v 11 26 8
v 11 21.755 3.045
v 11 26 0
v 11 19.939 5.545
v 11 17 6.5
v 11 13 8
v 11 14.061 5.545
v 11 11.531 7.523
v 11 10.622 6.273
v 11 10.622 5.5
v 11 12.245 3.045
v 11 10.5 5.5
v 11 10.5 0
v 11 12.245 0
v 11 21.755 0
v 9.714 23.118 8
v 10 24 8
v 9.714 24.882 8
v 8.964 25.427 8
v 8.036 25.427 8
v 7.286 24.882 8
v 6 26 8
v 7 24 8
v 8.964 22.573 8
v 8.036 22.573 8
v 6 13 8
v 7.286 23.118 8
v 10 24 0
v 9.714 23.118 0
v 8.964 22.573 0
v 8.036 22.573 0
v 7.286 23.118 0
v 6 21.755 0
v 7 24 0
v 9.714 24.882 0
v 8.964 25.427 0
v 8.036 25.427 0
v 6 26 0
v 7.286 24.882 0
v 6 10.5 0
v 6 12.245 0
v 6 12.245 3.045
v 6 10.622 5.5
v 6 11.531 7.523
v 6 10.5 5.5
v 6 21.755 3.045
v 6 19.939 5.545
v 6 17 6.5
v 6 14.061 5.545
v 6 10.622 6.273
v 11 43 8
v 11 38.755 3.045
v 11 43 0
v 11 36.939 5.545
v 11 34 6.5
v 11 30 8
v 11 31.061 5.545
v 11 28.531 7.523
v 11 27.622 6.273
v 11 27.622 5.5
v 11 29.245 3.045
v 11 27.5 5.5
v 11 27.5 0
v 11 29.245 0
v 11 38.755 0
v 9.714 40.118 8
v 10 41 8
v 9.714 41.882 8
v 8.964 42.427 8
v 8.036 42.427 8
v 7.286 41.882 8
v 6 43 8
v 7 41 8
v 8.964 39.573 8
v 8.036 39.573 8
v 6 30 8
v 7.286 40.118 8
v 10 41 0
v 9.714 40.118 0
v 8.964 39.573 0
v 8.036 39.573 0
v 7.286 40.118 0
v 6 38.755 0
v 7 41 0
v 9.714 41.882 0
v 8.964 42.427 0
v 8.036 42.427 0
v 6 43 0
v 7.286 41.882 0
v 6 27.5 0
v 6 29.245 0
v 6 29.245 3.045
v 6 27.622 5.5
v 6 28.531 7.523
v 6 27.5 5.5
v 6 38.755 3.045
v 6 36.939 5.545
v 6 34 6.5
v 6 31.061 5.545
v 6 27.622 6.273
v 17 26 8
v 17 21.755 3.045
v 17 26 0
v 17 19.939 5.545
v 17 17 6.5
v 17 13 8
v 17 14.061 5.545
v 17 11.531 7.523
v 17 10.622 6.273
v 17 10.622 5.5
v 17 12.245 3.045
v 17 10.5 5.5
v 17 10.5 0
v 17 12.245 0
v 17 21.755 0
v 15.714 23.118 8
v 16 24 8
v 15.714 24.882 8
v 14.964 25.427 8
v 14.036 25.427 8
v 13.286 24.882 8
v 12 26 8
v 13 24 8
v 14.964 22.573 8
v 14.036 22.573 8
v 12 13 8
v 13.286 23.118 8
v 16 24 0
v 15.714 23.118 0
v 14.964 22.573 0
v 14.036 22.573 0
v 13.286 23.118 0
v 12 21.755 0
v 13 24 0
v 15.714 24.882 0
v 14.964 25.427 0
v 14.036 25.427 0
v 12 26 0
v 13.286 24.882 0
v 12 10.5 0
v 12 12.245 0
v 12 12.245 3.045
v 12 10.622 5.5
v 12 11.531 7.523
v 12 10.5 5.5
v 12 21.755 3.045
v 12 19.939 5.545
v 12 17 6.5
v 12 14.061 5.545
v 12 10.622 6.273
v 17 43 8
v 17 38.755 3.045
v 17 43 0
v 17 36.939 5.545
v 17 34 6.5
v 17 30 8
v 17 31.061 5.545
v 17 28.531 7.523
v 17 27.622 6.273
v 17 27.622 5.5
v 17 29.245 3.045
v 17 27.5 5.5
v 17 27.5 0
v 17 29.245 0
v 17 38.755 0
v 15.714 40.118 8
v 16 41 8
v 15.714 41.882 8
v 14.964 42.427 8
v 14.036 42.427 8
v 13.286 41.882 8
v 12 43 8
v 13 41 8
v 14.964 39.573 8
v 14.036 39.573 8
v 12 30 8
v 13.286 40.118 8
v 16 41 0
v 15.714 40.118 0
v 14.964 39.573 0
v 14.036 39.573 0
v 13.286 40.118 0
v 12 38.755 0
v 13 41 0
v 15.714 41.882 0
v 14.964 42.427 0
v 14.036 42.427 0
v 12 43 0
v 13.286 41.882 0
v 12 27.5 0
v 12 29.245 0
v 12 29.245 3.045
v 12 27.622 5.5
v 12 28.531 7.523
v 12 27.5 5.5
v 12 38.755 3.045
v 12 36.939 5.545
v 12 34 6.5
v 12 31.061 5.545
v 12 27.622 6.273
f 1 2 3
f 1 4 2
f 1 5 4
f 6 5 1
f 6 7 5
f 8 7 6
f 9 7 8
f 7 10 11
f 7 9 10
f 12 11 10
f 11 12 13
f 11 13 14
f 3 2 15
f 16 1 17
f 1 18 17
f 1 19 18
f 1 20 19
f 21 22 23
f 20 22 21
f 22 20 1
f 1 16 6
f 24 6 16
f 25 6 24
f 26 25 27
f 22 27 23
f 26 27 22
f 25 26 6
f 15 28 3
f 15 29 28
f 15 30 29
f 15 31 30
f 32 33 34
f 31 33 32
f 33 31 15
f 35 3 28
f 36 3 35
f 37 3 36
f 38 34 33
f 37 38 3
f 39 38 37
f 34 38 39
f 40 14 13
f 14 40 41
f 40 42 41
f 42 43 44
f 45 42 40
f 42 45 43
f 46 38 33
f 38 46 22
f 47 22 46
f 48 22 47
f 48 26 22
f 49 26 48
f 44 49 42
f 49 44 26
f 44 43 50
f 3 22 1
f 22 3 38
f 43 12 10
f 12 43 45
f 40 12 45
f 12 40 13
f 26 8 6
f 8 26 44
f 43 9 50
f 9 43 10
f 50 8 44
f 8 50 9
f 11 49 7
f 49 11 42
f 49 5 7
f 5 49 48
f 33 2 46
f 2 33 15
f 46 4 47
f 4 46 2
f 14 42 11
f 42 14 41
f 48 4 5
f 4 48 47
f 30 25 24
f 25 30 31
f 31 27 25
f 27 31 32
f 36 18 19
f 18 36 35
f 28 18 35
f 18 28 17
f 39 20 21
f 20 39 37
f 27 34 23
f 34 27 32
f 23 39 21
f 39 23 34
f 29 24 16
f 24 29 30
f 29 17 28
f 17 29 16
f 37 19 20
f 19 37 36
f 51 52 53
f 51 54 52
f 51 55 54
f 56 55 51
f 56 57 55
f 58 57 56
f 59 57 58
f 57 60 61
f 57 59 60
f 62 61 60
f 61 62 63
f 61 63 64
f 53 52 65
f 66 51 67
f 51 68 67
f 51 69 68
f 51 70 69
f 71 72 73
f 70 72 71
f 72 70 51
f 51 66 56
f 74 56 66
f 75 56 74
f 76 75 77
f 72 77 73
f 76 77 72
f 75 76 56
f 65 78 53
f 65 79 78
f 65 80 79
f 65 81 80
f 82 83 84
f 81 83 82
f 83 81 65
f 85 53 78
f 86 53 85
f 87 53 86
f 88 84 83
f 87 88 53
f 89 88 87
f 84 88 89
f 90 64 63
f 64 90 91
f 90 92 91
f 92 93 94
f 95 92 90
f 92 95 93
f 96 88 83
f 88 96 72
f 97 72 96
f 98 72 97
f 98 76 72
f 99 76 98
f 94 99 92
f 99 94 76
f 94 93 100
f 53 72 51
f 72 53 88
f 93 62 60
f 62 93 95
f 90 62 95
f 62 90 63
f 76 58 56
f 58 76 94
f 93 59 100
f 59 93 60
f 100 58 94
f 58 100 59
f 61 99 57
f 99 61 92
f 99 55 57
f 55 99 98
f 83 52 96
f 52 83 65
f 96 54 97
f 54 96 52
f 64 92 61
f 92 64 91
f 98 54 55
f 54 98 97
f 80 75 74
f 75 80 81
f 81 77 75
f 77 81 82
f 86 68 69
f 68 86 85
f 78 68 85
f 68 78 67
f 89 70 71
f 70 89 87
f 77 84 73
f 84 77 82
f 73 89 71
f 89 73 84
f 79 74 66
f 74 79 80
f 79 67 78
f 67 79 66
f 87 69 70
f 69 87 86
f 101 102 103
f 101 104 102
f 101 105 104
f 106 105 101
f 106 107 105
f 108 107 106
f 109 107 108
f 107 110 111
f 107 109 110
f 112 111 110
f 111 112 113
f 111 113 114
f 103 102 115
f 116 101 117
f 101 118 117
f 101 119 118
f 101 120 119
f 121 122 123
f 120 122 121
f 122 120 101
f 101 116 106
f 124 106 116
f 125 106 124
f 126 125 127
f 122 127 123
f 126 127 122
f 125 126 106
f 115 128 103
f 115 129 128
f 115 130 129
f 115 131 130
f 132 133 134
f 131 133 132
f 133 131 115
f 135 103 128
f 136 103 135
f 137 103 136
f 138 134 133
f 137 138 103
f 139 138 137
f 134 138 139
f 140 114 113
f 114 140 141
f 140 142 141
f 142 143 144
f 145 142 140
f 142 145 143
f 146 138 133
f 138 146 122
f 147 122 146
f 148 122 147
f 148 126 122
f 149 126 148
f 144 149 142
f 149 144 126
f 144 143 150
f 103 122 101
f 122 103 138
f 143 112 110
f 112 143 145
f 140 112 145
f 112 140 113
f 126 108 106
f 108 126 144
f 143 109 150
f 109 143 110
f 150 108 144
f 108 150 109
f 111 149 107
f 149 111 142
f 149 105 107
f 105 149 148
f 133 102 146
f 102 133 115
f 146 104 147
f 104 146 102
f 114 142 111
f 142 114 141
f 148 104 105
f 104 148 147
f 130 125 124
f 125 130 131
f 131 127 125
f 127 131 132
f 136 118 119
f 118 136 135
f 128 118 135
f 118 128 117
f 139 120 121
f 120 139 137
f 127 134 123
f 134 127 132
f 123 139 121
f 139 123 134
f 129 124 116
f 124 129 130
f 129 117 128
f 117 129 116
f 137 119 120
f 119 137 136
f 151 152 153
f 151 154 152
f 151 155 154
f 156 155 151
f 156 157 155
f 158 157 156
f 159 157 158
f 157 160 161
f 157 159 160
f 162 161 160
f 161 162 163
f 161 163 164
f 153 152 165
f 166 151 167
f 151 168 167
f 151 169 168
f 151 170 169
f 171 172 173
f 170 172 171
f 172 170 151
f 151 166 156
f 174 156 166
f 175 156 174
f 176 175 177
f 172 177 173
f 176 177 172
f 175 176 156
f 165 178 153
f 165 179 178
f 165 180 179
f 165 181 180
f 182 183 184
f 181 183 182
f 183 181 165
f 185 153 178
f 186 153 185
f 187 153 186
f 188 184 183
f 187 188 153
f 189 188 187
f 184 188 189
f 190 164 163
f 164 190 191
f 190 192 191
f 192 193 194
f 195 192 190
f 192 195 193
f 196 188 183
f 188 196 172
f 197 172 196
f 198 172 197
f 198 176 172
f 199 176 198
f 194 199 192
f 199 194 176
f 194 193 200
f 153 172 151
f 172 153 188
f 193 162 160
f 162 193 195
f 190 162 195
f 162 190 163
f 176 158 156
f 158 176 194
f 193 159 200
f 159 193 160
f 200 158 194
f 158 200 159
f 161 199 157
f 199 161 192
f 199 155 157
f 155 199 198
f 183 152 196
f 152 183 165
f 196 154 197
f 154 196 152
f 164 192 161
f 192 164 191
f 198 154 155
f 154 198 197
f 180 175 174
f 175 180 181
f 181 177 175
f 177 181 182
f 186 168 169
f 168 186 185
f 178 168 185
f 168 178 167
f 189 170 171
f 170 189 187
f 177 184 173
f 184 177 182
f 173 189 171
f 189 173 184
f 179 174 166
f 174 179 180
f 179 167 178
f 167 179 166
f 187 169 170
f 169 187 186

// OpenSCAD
$fn = 10;

for (x= [1:2]){
    for(y=[1:2]){
        translate([6*x,17*y,0])
        clip();
    }
}



module clip(){
difference(){
    
translate([0,-4,0])
shell();

translate([0,0,1.5])
rotate([0,90,0])
    
cylinder(r=5,h=6);

translate([2.5,7,0])
cylinder(r=1.5,h=10);    
}

module shell(){
    cube([5,13,8]);   
    translate([0,-2.5,0])
   cube([5,10,5.5]);     
    rotate([0,90,0])
    translate([-5.5,0,0])
    cylinder(r=2.5,h=5);
}

}
